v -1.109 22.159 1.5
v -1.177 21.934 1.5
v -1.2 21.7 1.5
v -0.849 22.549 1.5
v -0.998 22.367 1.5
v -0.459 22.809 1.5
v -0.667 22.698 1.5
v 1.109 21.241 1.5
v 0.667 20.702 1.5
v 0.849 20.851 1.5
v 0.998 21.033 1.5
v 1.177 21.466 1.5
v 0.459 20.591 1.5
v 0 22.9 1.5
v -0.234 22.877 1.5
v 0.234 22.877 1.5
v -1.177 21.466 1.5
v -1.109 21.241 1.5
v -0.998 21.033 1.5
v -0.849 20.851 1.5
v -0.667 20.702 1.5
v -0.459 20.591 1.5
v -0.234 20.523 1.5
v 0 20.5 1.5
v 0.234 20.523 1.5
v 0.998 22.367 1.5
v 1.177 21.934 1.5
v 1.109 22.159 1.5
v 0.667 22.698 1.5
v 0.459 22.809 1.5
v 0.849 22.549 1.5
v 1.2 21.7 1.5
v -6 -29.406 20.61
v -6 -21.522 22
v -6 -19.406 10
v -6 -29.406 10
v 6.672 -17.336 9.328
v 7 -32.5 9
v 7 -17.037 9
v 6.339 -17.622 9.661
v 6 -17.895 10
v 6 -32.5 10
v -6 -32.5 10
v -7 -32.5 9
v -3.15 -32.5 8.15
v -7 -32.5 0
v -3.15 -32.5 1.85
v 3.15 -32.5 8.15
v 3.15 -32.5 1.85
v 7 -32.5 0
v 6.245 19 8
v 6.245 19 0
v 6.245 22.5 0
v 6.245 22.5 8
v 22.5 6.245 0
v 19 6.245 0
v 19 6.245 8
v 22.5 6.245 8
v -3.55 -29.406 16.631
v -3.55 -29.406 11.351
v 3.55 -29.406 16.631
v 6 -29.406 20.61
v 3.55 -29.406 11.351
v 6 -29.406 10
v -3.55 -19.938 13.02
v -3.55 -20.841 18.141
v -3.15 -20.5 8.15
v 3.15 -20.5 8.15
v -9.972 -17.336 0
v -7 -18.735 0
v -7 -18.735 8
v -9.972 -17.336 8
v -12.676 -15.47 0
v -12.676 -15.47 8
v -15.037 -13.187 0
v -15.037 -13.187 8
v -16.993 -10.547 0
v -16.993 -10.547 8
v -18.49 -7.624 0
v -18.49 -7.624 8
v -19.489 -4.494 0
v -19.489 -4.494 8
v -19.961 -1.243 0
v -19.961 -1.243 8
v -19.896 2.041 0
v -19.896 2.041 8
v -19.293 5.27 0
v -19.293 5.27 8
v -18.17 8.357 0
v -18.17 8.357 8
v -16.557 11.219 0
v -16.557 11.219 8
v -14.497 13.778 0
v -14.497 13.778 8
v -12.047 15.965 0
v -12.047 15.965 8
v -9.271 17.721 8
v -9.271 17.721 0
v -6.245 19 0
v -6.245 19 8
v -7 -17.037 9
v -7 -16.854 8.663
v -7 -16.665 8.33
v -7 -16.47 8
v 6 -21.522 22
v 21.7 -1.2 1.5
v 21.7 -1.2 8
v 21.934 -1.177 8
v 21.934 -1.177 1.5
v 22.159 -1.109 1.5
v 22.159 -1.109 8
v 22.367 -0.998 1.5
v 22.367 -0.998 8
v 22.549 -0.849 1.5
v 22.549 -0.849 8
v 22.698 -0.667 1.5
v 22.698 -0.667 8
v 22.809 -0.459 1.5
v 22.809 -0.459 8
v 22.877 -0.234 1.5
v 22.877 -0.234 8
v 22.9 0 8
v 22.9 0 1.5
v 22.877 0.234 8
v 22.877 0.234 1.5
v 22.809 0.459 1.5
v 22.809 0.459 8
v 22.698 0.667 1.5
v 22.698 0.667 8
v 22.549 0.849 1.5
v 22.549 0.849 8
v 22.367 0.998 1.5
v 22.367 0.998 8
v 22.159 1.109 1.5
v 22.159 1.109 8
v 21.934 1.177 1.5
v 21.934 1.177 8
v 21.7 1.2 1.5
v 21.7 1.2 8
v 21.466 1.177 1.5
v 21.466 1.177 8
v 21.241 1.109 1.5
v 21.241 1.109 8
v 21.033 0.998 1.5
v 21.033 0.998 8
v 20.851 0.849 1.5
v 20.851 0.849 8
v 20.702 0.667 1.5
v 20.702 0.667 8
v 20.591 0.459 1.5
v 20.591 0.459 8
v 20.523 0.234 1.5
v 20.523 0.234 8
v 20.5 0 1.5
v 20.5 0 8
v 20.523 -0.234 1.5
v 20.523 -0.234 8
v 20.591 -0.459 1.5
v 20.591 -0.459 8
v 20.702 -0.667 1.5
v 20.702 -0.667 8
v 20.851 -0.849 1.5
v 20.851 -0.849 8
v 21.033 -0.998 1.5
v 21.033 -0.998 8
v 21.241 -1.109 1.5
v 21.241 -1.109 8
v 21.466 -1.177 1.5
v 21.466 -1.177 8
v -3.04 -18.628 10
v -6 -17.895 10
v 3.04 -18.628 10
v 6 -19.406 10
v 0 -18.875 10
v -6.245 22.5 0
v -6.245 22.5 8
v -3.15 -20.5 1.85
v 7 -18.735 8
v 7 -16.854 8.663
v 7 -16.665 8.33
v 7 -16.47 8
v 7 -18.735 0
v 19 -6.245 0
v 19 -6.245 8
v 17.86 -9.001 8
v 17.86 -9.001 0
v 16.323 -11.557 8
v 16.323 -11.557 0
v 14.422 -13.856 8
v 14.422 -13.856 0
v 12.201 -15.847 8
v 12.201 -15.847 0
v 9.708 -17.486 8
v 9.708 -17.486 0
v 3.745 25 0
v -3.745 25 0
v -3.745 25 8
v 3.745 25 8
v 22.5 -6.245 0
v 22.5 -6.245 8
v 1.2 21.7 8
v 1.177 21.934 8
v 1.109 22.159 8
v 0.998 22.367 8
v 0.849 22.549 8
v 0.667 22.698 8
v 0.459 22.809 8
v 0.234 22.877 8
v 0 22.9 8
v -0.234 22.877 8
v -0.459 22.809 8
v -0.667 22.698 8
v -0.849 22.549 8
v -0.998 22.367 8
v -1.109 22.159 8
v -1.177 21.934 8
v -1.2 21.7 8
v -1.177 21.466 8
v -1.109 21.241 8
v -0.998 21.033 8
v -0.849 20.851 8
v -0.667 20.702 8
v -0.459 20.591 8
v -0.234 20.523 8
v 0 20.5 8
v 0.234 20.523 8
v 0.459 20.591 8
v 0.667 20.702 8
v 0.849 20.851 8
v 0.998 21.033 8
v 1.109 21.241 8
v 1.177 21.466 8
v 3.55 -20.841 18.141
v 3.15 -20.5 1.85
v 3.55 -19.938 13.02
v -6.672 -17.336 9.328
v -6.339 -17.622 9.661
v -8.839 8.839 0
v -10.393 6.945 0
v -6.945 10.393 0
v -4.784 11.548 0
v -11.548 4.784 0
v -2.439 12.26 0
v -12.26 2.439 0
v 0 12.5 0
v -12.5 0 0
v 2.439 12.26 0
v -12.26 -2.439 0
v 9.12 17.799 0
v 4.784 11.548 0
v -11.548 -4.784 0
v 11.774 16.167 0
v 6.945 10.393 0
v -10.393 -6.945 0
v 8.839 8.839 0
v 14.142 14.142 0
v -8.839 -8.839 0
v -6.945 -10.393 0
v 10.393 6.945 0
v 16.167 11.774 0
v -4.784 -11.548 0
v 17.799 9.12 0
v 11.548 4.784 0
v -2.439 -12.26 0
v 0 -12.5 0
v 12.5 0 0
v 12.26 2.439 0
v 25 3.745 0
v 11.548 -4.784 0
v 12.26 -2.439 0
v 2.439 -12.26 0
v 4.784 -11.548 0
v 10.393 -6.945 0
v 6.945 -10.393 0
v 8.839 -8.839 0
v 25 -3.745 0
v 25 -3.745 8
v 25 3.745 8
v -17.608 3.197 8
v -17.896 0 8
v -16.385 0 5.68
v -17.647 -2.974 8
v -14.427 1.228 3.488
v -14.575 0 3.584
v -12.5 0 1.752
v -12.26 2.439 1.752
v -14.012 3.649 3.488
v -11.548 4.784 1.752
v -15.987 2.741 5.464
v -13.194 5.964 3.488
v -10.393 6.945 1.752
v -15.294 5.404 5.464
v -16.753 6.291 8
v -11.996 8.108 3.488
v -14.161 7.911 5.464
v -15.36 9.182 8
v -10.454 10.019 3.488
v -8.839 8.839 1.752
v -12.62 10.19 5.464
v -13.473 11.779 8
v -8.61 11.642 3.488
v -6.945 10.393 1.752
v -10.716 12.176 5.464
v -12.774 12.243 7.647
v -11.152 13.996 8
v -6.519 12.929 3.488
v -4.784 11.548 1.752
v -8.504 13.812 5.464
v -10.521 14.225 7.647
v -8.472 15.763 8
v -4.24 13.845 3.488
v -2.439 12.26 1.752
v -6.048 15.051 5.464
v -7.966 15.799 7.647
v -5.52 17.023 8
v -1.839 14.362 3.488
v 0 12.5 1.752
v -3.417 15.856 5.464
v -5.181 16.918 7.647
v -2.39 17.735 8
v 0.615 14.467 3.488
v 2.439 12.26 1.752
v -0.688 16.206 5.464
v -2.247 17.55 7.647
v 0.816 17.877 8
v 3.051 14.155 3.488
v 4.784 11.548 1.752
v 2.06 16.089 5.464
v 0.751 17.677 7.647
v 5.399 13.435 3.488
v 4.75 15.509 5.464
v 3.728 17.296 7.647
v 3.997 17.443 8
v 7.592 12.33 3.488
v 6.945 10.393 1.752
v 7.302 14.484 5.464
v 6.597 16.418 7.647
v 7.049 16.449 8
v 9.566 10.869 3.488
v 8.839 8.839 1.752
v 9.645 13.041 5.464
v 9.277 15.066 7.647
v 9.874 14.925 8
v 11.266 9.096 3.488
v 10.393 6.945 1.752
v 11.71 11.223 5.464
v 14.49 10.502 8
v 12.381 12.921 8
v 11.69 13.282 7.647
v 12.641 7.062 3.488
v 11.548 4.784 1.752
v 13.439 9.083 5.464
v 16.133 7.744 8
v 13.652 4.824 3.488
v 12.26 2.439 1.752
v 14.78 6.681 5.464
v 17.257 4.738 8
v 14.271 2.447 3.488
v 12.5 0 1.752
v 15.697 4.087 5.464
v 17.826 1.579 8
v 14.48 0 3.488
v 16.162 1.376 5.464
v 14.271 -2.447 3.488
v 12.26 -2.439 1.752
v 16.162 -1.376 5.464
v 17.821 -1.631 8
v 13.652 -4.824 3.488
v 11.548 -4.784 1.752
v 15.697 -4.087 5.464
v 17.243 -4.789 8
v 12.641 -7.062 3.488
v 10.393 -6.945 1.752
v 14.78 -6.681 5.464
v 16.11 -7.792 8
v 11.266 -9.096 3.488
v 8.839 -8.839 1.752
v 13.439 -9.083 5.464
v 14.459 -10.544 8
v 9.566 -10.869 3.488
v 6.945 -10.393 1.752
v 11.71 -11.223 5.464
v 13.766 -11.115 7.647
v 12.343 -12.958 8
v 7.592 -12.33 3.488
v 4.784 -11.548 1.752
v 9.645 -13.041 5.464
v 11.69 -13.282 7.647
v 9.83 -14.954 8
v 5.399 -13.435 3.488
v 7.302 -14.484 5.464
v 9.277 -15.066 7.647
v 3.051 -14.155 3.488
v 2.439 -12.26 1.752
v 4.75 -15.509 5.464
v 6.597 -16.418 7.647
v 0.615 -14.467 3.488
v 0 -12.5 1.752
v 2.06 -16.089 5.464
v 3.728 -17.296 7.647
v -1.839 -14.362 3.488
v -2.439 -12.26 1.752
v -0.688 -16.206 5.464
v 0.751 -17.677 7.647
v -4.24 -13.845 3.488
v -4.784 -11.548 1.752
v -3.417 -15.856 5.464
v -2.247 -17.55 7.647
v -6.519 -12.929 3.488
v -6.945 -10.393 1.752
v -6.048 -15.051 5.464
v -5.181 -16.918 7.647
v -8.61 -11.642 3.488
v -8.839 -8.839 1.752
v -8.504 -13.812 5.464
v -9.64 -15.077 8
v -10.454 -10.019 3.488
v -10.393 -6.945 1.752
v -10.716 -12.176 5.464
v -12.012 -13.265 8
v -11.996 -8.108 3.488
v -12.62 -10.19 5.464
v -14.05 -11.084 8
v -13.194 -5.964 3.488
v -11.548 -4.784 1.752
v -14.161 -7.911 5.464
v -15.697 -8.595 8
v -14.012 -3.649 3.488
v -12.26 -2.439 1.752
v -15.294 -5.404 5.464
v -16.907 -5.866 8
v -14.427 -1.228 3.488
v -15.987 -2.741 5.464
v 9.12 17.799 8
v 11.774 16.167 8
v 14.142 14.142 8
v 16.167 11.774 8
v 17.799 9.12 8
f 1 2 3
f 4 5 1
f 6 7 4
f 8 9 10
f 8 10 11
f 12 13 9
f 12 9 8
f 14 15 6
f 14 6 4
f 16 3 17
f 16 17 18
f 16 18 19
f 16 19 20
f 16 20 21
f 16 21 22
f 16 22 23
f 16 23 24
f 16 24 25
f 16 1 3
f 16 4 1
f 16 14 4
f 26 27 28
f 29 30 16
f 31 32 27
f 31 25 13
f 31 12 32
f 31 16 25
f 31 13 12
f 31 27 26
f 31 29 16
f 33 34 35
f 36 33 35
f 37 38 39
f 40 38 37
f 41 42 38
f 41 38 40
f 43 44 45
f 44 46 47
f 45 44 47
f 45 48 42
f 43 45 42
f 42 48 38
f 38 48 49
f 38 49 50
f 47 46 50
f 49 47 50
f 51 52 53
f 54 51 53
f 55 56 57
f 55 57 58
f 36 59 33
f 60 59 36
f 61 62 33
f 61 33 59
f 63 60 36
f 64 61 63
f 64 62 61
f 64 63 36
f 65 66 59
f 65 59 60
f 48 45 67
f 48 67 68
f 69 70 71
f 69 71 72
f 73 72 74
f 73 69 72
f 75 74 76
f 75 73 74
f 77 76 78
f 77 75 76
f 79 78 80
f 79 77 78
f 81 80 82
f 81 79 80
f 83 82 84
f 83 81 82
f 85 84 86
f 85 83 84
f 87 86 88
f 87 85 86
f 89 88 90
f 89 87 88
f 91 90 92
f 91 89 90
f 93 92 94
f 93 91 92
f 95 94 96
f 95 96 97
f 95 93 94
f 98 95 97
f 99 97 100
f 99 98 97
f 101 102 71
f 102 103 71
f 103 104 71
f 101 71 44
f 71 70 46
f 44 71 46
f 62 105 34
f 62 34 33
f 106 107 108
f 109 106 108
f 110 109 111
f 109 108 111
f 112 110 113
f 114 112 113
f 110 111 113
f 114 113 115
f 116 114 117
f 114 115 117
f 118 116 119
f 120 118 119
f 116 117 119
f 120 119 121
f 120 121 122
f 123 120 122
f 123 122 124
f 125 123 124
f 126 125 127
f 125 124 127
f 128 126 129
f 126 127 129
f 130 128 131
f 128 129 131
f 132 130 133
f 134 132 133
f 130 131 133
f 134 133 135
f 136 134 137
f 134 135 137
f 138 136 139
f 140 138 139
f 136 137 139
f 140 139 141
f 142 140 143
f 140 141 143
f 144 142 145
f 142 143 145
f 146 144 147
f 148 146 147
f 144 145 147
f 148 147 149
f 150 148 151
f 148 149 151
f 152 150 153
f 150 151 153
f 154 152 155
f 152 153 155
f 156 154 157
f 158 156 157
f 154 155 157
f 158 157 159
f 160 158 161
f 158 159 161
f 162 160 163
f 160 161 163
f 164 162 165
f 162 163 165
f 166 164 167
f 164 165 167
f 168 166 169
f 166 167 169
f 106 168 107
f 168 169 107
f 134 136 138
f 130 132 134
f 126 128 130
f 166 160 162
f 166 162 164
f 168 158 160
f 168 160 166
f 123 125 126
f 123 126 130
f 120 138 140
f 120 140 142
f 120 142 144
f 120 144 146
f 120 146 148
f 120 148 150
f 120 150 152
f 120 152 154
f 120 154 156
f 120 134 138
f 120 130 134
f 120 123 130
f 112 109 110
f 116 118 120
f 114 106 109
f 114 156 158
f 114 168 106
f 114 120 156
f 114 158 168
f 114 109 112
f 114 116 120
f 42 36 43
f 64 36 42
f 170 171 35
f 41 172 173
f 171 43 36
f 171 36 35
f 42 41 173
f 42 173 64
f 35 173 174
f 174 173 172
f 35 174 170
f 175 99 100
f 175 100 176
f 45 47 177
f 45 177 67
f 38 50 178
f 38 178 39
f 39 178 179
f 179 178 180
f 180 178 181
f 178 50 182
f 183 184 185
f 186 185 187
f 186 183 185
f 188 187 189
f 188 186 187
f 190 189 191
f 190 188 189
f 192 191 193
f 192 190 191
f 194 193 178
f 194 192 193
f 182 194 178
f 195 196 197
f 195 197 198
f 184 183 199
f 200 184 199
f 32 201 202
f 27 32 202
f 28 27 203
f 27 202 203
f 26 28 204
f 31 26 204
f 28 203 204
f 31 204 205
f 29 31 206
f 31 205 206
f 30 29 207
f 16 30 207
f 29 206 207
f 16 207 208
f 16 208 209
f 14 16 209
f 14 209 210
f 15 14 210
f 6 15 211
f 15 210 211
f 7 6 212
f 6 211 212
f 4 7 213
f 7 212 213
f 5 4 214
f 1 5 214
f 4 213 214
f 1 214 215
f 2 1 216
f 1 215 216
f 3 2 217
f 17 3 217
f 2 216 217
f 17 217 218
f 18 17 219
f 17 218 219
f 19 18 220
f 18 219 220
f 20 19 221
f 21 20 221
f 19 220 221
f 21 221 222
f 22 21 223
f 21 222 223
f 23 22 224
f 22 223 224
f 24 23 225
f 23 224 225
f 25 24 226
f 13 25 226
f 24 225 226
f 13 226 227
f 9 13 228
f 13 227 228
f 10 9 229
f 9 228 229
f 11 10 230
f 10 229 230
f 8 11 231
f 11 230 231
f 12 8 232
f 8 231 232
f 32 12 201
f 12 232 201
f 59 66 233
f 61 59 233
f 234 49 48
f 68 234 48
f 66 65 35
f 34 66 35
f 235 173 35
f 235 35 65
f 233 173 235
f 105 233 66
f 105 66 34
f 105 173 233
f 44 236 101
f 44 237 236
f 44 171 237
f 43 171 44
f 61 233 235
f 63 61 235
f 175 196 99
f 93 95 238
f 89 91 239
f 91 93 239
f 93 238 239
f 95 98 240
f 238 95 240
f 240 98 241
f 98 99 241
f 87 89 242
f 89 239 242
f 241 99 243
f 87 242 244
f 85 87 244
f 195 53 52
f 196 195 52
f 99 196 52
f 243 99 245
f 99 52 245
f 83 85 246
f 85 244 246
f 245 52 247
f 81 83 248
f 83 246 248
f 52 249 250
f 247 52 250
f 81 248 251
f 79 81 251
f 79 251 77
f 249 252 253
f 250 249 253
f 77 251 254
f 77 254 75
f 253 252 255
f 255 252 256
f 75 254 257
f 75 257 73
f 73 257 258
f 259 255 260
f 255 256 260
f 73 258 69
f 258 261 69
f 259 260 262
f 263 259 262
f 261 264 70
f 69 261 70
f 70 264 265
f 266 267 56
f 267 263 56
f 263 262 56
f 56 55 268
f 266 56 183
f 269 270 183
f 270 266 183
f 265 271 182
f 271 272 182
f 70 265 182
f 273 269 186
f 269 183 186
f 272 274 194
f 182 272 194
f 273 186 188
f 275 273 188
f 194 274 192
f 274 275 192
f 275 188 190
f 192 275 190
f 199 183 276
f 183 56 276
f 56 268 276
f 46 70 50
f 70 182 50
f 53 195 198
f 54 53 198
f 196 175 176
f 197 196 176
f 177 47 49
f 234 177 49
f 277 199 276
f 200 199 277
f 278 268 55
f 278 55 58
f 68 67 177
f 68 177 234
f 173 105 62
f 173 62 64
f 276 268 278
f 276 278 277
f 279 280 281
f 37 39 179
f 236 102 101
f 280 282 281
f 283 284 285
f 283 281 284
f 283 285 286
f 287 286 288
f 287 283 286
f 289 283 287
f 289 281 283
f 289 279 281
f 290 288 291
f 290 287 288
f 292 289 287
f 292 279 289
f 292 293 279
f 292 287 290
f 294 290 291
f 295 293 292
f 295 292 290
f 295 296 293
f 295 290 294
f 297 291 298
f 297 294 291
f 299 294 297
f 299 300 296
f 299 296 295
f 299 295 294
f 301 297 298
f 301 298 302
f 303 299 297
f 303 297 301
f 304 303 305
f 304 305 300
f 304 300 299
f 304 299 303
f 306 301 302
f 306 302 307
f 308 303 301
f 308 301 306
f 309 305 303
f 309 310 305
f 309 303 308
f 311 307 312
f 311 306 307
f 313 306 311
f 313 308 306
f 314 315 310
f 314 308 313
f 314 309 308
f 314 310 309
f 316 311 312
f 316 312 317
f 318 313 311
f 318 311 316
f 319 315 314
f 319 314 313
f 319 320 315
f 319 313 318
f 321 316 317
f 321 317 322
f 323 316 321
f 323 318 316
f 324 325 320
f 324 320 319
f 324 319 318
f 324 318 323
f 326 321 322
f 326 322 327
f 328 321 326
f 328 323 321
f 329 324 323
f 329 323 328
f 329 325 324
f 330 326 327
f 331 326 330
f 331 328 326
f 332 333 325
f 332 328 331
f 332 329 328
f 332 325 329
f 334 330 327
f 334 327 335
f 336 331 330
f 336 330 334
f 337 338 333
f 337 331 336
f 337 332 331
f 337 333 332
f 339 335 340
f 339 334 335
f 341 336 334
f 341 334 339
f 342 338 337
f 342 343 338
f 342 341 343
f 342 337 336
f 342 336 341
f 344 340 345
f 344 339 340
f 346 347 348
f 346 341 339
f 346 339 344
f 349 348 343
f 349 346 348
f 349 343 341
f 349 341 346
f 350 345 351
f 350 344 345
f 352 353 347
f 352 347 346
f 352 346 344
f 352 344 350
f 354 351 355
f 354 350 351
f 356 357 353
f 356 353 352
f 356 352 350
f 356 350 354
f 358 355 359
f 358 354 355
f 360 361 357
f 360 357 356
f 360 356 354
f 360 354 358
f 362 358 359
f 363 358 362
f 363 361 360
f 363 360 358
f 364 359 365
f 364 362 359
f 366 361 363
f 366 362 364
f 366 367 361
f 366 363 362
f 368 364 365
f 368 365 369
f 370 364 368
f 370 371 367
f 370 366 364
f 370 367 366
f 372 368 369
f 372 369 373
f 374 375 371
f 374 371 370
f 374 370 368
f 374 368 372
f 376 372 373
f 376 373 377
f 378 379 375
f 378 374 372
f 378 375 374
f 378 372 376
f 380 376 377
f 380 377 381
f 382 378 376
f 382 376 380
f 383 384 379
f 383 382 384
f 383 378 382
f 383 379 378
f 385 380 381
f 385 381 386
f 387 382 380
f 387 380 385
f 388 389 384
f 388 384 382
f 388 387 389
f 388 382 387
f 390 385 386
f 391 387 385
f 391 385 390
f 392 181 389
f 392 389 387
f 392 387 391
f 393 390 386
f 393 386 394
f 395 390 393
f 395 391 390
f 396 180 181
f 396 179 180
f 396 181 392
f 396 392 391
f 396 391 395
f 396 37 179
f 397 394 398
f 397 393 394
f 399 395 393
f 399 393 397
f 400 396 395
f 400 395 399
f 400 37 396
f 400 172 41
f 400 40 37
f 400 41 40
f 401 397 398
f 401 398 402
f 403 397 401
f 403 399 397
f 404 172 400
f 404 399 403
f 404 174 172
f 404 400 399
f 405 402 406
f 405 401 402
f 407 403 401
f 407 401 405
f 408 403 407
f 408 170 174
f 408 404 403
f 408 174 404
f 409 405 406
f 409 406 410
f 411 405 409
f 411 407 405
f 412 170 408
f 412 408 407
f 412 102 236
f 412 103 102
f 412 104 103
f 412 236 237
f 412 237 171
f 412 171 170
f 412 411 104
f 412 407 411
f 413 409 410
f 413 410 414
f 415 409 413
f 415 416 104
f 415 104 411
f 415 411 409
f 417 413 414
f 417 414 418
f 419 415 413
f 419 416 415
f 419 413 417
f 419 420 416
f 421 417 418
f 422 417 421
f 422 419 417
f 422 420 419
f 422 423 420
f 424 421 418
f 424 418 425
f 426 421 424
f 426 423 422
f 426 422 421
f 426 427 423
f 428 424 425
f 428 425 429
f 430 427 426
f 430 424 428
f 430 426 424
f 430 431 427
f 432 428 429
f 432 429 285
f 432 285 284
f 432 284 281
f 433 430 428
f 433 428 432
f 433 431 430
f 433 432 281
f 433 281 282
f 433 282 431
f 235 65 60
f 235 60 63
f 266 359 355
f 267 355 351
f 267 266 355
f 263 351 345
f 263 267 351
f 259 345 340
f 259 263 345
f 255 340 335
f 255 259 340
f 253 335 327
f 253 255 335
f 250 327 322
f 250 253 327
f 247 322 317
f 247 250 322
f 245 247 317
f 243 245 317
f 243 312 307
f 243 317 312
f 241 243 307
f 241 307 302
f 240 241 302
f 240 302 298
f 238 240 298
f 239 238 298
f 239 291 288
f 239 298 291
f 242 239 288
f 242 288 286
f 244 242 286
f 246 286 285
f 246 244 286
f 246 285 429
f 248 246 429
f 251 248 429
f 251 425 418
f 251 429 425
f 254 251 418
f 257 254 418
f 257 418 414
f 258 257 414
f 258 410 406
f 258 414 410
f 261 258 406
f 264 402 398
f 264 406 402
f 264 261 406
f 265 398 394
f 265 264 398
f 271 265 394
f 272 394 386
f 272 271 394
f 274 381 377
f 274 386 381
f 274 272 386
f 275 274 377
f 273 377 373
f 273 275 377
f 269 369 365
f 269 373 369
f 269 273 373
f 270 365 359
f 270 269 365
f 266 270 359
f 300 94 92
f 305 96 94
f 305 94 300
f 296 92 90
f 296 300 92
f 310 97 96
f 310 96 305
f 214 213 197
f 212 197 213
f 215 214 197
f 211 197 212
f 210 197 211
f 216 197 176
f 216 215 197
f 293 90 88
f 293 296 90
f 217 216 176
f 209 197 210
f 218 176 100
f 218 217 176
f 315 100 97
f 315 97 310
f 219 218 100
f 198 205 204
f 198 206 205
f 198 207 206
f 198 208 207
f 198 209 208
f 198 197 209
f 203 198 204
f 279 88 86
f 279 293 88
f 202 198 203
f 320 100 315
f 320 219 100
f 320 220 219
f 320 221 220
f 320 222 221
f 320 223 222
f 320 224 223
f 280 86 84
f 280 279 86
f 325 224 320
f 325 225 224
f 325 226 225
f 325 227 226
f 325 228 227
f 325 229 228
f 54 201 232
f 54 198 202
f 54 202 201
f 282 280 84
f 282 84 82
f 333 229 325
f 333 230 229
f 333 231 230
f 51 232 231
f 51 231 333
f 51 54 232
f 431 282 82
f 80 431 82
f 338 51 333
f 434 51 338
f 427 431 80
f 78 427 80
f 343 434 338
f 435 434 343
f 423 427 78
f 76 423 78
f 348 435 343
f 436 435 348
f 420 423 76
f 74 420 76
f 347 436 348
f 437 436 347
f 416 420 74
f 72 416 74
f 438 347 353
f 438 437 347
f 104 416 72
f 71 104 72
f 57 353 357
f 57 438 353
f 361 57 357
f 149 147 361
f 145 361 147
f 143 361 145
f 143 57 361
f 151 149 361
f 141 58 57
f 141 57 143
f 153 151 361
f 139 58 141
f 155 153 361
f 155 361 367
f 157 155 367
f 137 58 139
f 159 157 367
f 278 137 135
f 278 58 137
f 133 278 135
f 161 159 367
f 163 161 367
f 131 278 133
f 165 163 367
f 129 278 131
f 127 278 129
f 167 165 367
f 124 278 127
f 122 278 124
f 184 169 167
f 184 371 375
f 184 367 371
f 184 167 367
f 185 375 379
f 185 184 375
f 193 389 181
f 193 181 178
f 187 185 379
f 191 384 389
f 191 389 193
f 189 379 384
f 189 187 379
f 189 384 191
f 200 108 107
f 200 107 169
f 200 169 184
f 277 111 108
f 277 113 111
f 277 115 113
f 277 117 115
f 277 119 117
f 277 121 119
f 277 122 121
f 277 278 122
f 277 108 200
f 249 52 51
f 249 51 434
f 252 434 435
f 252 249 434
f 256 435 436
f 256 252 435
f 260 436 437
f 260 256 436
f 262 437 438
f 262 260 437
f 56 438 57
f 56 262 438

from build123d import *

# Parameters (mm, degrees)
SKETCH1_R            = 12.5
BOSS_EXTRUDE1_DEPTH  = 8
BOSS_EXTRUDE2_DEPTH  = 10
SKETCH4_W            = 6.3
SKETCH4_H            = 6.3
CUT_EXTRUDE1_DEPTH   = 12
BOSS_EXTRUDE4_DEPTH  = 6
SKETCH13_W           = 7.1
SKETCH13_H           = 5.2
CUT_EXTRUDE5_DEPTH   = 51.192153127
SKETCH22_W           = 12.489995996
SKETCH22_H           = 4
BOSS_EXTRUDE10_DEPTH = 8
SKETCH24_R           = 1.2
CUT_EXTRUDE8_DEPTH   = 6.5
CIRPATTERN1_COUNT    = 2
CIRPATTERN1_ANGLE    = 90
CHAMFER1_SIZE        = 2.5
CHAMFER2_SIZE        = 1


with BuildPart() as part:
    # Sketch1 → Boss-Extrude1 (new body)
    with BuildSketch(Plane.XY):
        with BuildLine():
            Line((-6.244997998, 21), (6.244997998, 21))
            Line((6.244997998, 21), (6.244997998, 19))
            ThreePointArc((6.244997998, 19), (14.142135624, 14.142135624), (19, 6.244997998))
            Line((19, 6.244997998), (21, 6.244997998))
            Line((21, 6.244997998), (21, -6.244997998))
            Line((21, -6.244997998), (19, -6.244997998))
            ThreePointArc((19, -6.244997998), (11.728172066, -16.200308021), (0, -20))
            ThreePointArc((0, -20), (-19.748417658, -3.16227766), (-6.244997998, 19))
            Line((-6.244997998, 19), (-6.244997998, 21))
        make_face()
        Circle(SKETCH1_R, mode=Mode.SUBTRACT)
    extrude(amount=BOSS_EXTRUDE1_DEPTH)

    # Sketch3 → Boss-Extrude2 (add)
    with BuildSketch(Plane.XY):
        Polygon((-7, -18.734993995), (-7, -32.5), (7, -32.5), (7, -18.734993995), (7, -15.234993995), (-7, -15.234993995), align=None)
    extrude(amount=BOSS_EXTRUDE2_DEPTH)

    # Sketch2 → Cut-Revolve2 (revolve, cut)
    with BuildSketch(Plane(origin=(0, 0, 0), x_dir=(1, 0, 0), z_dir=(0, 1, 0))):
        with BuildLine():
            Line((0, -38.5), (0, 2.5))
            ThreePointArc((0, 2.5), (-20.5, -18), (0, -38.5))
        make_face()
    revolve(axis=Axis((0, 0, 8), (0, 0, -1)), mode=Mode.SUBTRACT)

    # Sketch4 → Cut-Extrude1 (cut)
    with BuildSketch(Plane.XZ.offset(32.5)):
        with Locations((0, 5)):
            Rectangle(SKETCH4_W, SKETCH4_H)
    extrude(amount=-CUT_EXTRUDE1_DEPTH, mode=Mode.SUBTRACT)

    # Sketch11 → Boss-Extrude4 (add, symmetric)
    with BuildSketch(Plane(origin=(0, 0, 0), x_dir=(0, 0, -1), z_dir=(1, 0, 0))):
        Polygon((-10, -19.405629698), (-22, -21.521553466), (-20.609824642, -29.405629698), (-10, -29.405629698), align=None)
    extrude(amount=BOSS_EXTRUDE4_DEPTH, both=True)

    # Sketch13 → Cut-Extrude5 (cut, through all)
    with BuildSketch(Plane(origin=(0, -17.110377647, -3.017021229), x_dir=(1, 0, 0), z_dir=(0, 0.9848077530122074, 0.17364817766693455))):
        with Locations((0, -18.884652651)):
            Rectangle(SKETCH13_W, SKETCH13_H)
    extrude(amount=-CUT_EXTRUDE5_DEPTH, mode=Mode.SUBTRACT)

    # Sketch22 → Boss-Extrude10 (add)
    with BuildSketch(Plane.XY):
        with Locations((0, 23)):
            Rectangle(SKETCH22_W, SKETCH22_H)
    boss_extrude10 = extrude(amount=BOSS_EXTRUDE10_DEPTH)

    # Sketch24 → Cut-Extrude8 (cut)
    with BuildSketch(Plane.XY.offset(8)):
        with Locations((0, 21.7)):
            Circle(SKETCH24_R)
    cut_extrude8 = extrude(amount=-CUT_EXTRUDE8_DEPTH, mode=Mode.SUBTRACT)

    # CirPattern1: Boss-Extrude10, Cut-Extrude8 ×2 about axis
    cirpattern1_axis = Axis((0, 0, 0), (0, 0, -1))
    add([boss_extrude10.rotate(cirpattern1_axis, i * CIRPATTERN1_ANGLE / (CIRPATTERN1_COUNT - 1)) for i in range(1, CIRPATTERN1_COUNT)])
    add([cut_extrude8.rotate(cirpattern1_axis, i * CIRPATTERN1_ANGLE / (CIRPATTERN1_COUNT - 1)) for i in range(1, CIRPATTERN1_COUNT)], mode=Mode.SUBTRACT)

    # Chamfer1
    chamfer1_edges = [part.edges().sort_by_distance(p)[0] for p in [
        (-6.244997998, 25, 4),
        (6.244997998, 25, 4),
        (25, 6.244997998, 4),
        (25, -6.244997998, 4),
    ]]
    chamfer(chamfer1_edges, length=CHAMFER1_SIZE)

    # Chamfer2
    chamfer2_edges = [part.edges().sort_by_distance(p)[0] for p in [
        (7, -25.014274071, 10),
        (-7, -25.014274071, 10),
    ]]
    chamfer(chamfer2_edges, length=CHAMFER2_SIZE - 0.0001)  # a hair under: the kernel refuses the full size


solid = part.part
